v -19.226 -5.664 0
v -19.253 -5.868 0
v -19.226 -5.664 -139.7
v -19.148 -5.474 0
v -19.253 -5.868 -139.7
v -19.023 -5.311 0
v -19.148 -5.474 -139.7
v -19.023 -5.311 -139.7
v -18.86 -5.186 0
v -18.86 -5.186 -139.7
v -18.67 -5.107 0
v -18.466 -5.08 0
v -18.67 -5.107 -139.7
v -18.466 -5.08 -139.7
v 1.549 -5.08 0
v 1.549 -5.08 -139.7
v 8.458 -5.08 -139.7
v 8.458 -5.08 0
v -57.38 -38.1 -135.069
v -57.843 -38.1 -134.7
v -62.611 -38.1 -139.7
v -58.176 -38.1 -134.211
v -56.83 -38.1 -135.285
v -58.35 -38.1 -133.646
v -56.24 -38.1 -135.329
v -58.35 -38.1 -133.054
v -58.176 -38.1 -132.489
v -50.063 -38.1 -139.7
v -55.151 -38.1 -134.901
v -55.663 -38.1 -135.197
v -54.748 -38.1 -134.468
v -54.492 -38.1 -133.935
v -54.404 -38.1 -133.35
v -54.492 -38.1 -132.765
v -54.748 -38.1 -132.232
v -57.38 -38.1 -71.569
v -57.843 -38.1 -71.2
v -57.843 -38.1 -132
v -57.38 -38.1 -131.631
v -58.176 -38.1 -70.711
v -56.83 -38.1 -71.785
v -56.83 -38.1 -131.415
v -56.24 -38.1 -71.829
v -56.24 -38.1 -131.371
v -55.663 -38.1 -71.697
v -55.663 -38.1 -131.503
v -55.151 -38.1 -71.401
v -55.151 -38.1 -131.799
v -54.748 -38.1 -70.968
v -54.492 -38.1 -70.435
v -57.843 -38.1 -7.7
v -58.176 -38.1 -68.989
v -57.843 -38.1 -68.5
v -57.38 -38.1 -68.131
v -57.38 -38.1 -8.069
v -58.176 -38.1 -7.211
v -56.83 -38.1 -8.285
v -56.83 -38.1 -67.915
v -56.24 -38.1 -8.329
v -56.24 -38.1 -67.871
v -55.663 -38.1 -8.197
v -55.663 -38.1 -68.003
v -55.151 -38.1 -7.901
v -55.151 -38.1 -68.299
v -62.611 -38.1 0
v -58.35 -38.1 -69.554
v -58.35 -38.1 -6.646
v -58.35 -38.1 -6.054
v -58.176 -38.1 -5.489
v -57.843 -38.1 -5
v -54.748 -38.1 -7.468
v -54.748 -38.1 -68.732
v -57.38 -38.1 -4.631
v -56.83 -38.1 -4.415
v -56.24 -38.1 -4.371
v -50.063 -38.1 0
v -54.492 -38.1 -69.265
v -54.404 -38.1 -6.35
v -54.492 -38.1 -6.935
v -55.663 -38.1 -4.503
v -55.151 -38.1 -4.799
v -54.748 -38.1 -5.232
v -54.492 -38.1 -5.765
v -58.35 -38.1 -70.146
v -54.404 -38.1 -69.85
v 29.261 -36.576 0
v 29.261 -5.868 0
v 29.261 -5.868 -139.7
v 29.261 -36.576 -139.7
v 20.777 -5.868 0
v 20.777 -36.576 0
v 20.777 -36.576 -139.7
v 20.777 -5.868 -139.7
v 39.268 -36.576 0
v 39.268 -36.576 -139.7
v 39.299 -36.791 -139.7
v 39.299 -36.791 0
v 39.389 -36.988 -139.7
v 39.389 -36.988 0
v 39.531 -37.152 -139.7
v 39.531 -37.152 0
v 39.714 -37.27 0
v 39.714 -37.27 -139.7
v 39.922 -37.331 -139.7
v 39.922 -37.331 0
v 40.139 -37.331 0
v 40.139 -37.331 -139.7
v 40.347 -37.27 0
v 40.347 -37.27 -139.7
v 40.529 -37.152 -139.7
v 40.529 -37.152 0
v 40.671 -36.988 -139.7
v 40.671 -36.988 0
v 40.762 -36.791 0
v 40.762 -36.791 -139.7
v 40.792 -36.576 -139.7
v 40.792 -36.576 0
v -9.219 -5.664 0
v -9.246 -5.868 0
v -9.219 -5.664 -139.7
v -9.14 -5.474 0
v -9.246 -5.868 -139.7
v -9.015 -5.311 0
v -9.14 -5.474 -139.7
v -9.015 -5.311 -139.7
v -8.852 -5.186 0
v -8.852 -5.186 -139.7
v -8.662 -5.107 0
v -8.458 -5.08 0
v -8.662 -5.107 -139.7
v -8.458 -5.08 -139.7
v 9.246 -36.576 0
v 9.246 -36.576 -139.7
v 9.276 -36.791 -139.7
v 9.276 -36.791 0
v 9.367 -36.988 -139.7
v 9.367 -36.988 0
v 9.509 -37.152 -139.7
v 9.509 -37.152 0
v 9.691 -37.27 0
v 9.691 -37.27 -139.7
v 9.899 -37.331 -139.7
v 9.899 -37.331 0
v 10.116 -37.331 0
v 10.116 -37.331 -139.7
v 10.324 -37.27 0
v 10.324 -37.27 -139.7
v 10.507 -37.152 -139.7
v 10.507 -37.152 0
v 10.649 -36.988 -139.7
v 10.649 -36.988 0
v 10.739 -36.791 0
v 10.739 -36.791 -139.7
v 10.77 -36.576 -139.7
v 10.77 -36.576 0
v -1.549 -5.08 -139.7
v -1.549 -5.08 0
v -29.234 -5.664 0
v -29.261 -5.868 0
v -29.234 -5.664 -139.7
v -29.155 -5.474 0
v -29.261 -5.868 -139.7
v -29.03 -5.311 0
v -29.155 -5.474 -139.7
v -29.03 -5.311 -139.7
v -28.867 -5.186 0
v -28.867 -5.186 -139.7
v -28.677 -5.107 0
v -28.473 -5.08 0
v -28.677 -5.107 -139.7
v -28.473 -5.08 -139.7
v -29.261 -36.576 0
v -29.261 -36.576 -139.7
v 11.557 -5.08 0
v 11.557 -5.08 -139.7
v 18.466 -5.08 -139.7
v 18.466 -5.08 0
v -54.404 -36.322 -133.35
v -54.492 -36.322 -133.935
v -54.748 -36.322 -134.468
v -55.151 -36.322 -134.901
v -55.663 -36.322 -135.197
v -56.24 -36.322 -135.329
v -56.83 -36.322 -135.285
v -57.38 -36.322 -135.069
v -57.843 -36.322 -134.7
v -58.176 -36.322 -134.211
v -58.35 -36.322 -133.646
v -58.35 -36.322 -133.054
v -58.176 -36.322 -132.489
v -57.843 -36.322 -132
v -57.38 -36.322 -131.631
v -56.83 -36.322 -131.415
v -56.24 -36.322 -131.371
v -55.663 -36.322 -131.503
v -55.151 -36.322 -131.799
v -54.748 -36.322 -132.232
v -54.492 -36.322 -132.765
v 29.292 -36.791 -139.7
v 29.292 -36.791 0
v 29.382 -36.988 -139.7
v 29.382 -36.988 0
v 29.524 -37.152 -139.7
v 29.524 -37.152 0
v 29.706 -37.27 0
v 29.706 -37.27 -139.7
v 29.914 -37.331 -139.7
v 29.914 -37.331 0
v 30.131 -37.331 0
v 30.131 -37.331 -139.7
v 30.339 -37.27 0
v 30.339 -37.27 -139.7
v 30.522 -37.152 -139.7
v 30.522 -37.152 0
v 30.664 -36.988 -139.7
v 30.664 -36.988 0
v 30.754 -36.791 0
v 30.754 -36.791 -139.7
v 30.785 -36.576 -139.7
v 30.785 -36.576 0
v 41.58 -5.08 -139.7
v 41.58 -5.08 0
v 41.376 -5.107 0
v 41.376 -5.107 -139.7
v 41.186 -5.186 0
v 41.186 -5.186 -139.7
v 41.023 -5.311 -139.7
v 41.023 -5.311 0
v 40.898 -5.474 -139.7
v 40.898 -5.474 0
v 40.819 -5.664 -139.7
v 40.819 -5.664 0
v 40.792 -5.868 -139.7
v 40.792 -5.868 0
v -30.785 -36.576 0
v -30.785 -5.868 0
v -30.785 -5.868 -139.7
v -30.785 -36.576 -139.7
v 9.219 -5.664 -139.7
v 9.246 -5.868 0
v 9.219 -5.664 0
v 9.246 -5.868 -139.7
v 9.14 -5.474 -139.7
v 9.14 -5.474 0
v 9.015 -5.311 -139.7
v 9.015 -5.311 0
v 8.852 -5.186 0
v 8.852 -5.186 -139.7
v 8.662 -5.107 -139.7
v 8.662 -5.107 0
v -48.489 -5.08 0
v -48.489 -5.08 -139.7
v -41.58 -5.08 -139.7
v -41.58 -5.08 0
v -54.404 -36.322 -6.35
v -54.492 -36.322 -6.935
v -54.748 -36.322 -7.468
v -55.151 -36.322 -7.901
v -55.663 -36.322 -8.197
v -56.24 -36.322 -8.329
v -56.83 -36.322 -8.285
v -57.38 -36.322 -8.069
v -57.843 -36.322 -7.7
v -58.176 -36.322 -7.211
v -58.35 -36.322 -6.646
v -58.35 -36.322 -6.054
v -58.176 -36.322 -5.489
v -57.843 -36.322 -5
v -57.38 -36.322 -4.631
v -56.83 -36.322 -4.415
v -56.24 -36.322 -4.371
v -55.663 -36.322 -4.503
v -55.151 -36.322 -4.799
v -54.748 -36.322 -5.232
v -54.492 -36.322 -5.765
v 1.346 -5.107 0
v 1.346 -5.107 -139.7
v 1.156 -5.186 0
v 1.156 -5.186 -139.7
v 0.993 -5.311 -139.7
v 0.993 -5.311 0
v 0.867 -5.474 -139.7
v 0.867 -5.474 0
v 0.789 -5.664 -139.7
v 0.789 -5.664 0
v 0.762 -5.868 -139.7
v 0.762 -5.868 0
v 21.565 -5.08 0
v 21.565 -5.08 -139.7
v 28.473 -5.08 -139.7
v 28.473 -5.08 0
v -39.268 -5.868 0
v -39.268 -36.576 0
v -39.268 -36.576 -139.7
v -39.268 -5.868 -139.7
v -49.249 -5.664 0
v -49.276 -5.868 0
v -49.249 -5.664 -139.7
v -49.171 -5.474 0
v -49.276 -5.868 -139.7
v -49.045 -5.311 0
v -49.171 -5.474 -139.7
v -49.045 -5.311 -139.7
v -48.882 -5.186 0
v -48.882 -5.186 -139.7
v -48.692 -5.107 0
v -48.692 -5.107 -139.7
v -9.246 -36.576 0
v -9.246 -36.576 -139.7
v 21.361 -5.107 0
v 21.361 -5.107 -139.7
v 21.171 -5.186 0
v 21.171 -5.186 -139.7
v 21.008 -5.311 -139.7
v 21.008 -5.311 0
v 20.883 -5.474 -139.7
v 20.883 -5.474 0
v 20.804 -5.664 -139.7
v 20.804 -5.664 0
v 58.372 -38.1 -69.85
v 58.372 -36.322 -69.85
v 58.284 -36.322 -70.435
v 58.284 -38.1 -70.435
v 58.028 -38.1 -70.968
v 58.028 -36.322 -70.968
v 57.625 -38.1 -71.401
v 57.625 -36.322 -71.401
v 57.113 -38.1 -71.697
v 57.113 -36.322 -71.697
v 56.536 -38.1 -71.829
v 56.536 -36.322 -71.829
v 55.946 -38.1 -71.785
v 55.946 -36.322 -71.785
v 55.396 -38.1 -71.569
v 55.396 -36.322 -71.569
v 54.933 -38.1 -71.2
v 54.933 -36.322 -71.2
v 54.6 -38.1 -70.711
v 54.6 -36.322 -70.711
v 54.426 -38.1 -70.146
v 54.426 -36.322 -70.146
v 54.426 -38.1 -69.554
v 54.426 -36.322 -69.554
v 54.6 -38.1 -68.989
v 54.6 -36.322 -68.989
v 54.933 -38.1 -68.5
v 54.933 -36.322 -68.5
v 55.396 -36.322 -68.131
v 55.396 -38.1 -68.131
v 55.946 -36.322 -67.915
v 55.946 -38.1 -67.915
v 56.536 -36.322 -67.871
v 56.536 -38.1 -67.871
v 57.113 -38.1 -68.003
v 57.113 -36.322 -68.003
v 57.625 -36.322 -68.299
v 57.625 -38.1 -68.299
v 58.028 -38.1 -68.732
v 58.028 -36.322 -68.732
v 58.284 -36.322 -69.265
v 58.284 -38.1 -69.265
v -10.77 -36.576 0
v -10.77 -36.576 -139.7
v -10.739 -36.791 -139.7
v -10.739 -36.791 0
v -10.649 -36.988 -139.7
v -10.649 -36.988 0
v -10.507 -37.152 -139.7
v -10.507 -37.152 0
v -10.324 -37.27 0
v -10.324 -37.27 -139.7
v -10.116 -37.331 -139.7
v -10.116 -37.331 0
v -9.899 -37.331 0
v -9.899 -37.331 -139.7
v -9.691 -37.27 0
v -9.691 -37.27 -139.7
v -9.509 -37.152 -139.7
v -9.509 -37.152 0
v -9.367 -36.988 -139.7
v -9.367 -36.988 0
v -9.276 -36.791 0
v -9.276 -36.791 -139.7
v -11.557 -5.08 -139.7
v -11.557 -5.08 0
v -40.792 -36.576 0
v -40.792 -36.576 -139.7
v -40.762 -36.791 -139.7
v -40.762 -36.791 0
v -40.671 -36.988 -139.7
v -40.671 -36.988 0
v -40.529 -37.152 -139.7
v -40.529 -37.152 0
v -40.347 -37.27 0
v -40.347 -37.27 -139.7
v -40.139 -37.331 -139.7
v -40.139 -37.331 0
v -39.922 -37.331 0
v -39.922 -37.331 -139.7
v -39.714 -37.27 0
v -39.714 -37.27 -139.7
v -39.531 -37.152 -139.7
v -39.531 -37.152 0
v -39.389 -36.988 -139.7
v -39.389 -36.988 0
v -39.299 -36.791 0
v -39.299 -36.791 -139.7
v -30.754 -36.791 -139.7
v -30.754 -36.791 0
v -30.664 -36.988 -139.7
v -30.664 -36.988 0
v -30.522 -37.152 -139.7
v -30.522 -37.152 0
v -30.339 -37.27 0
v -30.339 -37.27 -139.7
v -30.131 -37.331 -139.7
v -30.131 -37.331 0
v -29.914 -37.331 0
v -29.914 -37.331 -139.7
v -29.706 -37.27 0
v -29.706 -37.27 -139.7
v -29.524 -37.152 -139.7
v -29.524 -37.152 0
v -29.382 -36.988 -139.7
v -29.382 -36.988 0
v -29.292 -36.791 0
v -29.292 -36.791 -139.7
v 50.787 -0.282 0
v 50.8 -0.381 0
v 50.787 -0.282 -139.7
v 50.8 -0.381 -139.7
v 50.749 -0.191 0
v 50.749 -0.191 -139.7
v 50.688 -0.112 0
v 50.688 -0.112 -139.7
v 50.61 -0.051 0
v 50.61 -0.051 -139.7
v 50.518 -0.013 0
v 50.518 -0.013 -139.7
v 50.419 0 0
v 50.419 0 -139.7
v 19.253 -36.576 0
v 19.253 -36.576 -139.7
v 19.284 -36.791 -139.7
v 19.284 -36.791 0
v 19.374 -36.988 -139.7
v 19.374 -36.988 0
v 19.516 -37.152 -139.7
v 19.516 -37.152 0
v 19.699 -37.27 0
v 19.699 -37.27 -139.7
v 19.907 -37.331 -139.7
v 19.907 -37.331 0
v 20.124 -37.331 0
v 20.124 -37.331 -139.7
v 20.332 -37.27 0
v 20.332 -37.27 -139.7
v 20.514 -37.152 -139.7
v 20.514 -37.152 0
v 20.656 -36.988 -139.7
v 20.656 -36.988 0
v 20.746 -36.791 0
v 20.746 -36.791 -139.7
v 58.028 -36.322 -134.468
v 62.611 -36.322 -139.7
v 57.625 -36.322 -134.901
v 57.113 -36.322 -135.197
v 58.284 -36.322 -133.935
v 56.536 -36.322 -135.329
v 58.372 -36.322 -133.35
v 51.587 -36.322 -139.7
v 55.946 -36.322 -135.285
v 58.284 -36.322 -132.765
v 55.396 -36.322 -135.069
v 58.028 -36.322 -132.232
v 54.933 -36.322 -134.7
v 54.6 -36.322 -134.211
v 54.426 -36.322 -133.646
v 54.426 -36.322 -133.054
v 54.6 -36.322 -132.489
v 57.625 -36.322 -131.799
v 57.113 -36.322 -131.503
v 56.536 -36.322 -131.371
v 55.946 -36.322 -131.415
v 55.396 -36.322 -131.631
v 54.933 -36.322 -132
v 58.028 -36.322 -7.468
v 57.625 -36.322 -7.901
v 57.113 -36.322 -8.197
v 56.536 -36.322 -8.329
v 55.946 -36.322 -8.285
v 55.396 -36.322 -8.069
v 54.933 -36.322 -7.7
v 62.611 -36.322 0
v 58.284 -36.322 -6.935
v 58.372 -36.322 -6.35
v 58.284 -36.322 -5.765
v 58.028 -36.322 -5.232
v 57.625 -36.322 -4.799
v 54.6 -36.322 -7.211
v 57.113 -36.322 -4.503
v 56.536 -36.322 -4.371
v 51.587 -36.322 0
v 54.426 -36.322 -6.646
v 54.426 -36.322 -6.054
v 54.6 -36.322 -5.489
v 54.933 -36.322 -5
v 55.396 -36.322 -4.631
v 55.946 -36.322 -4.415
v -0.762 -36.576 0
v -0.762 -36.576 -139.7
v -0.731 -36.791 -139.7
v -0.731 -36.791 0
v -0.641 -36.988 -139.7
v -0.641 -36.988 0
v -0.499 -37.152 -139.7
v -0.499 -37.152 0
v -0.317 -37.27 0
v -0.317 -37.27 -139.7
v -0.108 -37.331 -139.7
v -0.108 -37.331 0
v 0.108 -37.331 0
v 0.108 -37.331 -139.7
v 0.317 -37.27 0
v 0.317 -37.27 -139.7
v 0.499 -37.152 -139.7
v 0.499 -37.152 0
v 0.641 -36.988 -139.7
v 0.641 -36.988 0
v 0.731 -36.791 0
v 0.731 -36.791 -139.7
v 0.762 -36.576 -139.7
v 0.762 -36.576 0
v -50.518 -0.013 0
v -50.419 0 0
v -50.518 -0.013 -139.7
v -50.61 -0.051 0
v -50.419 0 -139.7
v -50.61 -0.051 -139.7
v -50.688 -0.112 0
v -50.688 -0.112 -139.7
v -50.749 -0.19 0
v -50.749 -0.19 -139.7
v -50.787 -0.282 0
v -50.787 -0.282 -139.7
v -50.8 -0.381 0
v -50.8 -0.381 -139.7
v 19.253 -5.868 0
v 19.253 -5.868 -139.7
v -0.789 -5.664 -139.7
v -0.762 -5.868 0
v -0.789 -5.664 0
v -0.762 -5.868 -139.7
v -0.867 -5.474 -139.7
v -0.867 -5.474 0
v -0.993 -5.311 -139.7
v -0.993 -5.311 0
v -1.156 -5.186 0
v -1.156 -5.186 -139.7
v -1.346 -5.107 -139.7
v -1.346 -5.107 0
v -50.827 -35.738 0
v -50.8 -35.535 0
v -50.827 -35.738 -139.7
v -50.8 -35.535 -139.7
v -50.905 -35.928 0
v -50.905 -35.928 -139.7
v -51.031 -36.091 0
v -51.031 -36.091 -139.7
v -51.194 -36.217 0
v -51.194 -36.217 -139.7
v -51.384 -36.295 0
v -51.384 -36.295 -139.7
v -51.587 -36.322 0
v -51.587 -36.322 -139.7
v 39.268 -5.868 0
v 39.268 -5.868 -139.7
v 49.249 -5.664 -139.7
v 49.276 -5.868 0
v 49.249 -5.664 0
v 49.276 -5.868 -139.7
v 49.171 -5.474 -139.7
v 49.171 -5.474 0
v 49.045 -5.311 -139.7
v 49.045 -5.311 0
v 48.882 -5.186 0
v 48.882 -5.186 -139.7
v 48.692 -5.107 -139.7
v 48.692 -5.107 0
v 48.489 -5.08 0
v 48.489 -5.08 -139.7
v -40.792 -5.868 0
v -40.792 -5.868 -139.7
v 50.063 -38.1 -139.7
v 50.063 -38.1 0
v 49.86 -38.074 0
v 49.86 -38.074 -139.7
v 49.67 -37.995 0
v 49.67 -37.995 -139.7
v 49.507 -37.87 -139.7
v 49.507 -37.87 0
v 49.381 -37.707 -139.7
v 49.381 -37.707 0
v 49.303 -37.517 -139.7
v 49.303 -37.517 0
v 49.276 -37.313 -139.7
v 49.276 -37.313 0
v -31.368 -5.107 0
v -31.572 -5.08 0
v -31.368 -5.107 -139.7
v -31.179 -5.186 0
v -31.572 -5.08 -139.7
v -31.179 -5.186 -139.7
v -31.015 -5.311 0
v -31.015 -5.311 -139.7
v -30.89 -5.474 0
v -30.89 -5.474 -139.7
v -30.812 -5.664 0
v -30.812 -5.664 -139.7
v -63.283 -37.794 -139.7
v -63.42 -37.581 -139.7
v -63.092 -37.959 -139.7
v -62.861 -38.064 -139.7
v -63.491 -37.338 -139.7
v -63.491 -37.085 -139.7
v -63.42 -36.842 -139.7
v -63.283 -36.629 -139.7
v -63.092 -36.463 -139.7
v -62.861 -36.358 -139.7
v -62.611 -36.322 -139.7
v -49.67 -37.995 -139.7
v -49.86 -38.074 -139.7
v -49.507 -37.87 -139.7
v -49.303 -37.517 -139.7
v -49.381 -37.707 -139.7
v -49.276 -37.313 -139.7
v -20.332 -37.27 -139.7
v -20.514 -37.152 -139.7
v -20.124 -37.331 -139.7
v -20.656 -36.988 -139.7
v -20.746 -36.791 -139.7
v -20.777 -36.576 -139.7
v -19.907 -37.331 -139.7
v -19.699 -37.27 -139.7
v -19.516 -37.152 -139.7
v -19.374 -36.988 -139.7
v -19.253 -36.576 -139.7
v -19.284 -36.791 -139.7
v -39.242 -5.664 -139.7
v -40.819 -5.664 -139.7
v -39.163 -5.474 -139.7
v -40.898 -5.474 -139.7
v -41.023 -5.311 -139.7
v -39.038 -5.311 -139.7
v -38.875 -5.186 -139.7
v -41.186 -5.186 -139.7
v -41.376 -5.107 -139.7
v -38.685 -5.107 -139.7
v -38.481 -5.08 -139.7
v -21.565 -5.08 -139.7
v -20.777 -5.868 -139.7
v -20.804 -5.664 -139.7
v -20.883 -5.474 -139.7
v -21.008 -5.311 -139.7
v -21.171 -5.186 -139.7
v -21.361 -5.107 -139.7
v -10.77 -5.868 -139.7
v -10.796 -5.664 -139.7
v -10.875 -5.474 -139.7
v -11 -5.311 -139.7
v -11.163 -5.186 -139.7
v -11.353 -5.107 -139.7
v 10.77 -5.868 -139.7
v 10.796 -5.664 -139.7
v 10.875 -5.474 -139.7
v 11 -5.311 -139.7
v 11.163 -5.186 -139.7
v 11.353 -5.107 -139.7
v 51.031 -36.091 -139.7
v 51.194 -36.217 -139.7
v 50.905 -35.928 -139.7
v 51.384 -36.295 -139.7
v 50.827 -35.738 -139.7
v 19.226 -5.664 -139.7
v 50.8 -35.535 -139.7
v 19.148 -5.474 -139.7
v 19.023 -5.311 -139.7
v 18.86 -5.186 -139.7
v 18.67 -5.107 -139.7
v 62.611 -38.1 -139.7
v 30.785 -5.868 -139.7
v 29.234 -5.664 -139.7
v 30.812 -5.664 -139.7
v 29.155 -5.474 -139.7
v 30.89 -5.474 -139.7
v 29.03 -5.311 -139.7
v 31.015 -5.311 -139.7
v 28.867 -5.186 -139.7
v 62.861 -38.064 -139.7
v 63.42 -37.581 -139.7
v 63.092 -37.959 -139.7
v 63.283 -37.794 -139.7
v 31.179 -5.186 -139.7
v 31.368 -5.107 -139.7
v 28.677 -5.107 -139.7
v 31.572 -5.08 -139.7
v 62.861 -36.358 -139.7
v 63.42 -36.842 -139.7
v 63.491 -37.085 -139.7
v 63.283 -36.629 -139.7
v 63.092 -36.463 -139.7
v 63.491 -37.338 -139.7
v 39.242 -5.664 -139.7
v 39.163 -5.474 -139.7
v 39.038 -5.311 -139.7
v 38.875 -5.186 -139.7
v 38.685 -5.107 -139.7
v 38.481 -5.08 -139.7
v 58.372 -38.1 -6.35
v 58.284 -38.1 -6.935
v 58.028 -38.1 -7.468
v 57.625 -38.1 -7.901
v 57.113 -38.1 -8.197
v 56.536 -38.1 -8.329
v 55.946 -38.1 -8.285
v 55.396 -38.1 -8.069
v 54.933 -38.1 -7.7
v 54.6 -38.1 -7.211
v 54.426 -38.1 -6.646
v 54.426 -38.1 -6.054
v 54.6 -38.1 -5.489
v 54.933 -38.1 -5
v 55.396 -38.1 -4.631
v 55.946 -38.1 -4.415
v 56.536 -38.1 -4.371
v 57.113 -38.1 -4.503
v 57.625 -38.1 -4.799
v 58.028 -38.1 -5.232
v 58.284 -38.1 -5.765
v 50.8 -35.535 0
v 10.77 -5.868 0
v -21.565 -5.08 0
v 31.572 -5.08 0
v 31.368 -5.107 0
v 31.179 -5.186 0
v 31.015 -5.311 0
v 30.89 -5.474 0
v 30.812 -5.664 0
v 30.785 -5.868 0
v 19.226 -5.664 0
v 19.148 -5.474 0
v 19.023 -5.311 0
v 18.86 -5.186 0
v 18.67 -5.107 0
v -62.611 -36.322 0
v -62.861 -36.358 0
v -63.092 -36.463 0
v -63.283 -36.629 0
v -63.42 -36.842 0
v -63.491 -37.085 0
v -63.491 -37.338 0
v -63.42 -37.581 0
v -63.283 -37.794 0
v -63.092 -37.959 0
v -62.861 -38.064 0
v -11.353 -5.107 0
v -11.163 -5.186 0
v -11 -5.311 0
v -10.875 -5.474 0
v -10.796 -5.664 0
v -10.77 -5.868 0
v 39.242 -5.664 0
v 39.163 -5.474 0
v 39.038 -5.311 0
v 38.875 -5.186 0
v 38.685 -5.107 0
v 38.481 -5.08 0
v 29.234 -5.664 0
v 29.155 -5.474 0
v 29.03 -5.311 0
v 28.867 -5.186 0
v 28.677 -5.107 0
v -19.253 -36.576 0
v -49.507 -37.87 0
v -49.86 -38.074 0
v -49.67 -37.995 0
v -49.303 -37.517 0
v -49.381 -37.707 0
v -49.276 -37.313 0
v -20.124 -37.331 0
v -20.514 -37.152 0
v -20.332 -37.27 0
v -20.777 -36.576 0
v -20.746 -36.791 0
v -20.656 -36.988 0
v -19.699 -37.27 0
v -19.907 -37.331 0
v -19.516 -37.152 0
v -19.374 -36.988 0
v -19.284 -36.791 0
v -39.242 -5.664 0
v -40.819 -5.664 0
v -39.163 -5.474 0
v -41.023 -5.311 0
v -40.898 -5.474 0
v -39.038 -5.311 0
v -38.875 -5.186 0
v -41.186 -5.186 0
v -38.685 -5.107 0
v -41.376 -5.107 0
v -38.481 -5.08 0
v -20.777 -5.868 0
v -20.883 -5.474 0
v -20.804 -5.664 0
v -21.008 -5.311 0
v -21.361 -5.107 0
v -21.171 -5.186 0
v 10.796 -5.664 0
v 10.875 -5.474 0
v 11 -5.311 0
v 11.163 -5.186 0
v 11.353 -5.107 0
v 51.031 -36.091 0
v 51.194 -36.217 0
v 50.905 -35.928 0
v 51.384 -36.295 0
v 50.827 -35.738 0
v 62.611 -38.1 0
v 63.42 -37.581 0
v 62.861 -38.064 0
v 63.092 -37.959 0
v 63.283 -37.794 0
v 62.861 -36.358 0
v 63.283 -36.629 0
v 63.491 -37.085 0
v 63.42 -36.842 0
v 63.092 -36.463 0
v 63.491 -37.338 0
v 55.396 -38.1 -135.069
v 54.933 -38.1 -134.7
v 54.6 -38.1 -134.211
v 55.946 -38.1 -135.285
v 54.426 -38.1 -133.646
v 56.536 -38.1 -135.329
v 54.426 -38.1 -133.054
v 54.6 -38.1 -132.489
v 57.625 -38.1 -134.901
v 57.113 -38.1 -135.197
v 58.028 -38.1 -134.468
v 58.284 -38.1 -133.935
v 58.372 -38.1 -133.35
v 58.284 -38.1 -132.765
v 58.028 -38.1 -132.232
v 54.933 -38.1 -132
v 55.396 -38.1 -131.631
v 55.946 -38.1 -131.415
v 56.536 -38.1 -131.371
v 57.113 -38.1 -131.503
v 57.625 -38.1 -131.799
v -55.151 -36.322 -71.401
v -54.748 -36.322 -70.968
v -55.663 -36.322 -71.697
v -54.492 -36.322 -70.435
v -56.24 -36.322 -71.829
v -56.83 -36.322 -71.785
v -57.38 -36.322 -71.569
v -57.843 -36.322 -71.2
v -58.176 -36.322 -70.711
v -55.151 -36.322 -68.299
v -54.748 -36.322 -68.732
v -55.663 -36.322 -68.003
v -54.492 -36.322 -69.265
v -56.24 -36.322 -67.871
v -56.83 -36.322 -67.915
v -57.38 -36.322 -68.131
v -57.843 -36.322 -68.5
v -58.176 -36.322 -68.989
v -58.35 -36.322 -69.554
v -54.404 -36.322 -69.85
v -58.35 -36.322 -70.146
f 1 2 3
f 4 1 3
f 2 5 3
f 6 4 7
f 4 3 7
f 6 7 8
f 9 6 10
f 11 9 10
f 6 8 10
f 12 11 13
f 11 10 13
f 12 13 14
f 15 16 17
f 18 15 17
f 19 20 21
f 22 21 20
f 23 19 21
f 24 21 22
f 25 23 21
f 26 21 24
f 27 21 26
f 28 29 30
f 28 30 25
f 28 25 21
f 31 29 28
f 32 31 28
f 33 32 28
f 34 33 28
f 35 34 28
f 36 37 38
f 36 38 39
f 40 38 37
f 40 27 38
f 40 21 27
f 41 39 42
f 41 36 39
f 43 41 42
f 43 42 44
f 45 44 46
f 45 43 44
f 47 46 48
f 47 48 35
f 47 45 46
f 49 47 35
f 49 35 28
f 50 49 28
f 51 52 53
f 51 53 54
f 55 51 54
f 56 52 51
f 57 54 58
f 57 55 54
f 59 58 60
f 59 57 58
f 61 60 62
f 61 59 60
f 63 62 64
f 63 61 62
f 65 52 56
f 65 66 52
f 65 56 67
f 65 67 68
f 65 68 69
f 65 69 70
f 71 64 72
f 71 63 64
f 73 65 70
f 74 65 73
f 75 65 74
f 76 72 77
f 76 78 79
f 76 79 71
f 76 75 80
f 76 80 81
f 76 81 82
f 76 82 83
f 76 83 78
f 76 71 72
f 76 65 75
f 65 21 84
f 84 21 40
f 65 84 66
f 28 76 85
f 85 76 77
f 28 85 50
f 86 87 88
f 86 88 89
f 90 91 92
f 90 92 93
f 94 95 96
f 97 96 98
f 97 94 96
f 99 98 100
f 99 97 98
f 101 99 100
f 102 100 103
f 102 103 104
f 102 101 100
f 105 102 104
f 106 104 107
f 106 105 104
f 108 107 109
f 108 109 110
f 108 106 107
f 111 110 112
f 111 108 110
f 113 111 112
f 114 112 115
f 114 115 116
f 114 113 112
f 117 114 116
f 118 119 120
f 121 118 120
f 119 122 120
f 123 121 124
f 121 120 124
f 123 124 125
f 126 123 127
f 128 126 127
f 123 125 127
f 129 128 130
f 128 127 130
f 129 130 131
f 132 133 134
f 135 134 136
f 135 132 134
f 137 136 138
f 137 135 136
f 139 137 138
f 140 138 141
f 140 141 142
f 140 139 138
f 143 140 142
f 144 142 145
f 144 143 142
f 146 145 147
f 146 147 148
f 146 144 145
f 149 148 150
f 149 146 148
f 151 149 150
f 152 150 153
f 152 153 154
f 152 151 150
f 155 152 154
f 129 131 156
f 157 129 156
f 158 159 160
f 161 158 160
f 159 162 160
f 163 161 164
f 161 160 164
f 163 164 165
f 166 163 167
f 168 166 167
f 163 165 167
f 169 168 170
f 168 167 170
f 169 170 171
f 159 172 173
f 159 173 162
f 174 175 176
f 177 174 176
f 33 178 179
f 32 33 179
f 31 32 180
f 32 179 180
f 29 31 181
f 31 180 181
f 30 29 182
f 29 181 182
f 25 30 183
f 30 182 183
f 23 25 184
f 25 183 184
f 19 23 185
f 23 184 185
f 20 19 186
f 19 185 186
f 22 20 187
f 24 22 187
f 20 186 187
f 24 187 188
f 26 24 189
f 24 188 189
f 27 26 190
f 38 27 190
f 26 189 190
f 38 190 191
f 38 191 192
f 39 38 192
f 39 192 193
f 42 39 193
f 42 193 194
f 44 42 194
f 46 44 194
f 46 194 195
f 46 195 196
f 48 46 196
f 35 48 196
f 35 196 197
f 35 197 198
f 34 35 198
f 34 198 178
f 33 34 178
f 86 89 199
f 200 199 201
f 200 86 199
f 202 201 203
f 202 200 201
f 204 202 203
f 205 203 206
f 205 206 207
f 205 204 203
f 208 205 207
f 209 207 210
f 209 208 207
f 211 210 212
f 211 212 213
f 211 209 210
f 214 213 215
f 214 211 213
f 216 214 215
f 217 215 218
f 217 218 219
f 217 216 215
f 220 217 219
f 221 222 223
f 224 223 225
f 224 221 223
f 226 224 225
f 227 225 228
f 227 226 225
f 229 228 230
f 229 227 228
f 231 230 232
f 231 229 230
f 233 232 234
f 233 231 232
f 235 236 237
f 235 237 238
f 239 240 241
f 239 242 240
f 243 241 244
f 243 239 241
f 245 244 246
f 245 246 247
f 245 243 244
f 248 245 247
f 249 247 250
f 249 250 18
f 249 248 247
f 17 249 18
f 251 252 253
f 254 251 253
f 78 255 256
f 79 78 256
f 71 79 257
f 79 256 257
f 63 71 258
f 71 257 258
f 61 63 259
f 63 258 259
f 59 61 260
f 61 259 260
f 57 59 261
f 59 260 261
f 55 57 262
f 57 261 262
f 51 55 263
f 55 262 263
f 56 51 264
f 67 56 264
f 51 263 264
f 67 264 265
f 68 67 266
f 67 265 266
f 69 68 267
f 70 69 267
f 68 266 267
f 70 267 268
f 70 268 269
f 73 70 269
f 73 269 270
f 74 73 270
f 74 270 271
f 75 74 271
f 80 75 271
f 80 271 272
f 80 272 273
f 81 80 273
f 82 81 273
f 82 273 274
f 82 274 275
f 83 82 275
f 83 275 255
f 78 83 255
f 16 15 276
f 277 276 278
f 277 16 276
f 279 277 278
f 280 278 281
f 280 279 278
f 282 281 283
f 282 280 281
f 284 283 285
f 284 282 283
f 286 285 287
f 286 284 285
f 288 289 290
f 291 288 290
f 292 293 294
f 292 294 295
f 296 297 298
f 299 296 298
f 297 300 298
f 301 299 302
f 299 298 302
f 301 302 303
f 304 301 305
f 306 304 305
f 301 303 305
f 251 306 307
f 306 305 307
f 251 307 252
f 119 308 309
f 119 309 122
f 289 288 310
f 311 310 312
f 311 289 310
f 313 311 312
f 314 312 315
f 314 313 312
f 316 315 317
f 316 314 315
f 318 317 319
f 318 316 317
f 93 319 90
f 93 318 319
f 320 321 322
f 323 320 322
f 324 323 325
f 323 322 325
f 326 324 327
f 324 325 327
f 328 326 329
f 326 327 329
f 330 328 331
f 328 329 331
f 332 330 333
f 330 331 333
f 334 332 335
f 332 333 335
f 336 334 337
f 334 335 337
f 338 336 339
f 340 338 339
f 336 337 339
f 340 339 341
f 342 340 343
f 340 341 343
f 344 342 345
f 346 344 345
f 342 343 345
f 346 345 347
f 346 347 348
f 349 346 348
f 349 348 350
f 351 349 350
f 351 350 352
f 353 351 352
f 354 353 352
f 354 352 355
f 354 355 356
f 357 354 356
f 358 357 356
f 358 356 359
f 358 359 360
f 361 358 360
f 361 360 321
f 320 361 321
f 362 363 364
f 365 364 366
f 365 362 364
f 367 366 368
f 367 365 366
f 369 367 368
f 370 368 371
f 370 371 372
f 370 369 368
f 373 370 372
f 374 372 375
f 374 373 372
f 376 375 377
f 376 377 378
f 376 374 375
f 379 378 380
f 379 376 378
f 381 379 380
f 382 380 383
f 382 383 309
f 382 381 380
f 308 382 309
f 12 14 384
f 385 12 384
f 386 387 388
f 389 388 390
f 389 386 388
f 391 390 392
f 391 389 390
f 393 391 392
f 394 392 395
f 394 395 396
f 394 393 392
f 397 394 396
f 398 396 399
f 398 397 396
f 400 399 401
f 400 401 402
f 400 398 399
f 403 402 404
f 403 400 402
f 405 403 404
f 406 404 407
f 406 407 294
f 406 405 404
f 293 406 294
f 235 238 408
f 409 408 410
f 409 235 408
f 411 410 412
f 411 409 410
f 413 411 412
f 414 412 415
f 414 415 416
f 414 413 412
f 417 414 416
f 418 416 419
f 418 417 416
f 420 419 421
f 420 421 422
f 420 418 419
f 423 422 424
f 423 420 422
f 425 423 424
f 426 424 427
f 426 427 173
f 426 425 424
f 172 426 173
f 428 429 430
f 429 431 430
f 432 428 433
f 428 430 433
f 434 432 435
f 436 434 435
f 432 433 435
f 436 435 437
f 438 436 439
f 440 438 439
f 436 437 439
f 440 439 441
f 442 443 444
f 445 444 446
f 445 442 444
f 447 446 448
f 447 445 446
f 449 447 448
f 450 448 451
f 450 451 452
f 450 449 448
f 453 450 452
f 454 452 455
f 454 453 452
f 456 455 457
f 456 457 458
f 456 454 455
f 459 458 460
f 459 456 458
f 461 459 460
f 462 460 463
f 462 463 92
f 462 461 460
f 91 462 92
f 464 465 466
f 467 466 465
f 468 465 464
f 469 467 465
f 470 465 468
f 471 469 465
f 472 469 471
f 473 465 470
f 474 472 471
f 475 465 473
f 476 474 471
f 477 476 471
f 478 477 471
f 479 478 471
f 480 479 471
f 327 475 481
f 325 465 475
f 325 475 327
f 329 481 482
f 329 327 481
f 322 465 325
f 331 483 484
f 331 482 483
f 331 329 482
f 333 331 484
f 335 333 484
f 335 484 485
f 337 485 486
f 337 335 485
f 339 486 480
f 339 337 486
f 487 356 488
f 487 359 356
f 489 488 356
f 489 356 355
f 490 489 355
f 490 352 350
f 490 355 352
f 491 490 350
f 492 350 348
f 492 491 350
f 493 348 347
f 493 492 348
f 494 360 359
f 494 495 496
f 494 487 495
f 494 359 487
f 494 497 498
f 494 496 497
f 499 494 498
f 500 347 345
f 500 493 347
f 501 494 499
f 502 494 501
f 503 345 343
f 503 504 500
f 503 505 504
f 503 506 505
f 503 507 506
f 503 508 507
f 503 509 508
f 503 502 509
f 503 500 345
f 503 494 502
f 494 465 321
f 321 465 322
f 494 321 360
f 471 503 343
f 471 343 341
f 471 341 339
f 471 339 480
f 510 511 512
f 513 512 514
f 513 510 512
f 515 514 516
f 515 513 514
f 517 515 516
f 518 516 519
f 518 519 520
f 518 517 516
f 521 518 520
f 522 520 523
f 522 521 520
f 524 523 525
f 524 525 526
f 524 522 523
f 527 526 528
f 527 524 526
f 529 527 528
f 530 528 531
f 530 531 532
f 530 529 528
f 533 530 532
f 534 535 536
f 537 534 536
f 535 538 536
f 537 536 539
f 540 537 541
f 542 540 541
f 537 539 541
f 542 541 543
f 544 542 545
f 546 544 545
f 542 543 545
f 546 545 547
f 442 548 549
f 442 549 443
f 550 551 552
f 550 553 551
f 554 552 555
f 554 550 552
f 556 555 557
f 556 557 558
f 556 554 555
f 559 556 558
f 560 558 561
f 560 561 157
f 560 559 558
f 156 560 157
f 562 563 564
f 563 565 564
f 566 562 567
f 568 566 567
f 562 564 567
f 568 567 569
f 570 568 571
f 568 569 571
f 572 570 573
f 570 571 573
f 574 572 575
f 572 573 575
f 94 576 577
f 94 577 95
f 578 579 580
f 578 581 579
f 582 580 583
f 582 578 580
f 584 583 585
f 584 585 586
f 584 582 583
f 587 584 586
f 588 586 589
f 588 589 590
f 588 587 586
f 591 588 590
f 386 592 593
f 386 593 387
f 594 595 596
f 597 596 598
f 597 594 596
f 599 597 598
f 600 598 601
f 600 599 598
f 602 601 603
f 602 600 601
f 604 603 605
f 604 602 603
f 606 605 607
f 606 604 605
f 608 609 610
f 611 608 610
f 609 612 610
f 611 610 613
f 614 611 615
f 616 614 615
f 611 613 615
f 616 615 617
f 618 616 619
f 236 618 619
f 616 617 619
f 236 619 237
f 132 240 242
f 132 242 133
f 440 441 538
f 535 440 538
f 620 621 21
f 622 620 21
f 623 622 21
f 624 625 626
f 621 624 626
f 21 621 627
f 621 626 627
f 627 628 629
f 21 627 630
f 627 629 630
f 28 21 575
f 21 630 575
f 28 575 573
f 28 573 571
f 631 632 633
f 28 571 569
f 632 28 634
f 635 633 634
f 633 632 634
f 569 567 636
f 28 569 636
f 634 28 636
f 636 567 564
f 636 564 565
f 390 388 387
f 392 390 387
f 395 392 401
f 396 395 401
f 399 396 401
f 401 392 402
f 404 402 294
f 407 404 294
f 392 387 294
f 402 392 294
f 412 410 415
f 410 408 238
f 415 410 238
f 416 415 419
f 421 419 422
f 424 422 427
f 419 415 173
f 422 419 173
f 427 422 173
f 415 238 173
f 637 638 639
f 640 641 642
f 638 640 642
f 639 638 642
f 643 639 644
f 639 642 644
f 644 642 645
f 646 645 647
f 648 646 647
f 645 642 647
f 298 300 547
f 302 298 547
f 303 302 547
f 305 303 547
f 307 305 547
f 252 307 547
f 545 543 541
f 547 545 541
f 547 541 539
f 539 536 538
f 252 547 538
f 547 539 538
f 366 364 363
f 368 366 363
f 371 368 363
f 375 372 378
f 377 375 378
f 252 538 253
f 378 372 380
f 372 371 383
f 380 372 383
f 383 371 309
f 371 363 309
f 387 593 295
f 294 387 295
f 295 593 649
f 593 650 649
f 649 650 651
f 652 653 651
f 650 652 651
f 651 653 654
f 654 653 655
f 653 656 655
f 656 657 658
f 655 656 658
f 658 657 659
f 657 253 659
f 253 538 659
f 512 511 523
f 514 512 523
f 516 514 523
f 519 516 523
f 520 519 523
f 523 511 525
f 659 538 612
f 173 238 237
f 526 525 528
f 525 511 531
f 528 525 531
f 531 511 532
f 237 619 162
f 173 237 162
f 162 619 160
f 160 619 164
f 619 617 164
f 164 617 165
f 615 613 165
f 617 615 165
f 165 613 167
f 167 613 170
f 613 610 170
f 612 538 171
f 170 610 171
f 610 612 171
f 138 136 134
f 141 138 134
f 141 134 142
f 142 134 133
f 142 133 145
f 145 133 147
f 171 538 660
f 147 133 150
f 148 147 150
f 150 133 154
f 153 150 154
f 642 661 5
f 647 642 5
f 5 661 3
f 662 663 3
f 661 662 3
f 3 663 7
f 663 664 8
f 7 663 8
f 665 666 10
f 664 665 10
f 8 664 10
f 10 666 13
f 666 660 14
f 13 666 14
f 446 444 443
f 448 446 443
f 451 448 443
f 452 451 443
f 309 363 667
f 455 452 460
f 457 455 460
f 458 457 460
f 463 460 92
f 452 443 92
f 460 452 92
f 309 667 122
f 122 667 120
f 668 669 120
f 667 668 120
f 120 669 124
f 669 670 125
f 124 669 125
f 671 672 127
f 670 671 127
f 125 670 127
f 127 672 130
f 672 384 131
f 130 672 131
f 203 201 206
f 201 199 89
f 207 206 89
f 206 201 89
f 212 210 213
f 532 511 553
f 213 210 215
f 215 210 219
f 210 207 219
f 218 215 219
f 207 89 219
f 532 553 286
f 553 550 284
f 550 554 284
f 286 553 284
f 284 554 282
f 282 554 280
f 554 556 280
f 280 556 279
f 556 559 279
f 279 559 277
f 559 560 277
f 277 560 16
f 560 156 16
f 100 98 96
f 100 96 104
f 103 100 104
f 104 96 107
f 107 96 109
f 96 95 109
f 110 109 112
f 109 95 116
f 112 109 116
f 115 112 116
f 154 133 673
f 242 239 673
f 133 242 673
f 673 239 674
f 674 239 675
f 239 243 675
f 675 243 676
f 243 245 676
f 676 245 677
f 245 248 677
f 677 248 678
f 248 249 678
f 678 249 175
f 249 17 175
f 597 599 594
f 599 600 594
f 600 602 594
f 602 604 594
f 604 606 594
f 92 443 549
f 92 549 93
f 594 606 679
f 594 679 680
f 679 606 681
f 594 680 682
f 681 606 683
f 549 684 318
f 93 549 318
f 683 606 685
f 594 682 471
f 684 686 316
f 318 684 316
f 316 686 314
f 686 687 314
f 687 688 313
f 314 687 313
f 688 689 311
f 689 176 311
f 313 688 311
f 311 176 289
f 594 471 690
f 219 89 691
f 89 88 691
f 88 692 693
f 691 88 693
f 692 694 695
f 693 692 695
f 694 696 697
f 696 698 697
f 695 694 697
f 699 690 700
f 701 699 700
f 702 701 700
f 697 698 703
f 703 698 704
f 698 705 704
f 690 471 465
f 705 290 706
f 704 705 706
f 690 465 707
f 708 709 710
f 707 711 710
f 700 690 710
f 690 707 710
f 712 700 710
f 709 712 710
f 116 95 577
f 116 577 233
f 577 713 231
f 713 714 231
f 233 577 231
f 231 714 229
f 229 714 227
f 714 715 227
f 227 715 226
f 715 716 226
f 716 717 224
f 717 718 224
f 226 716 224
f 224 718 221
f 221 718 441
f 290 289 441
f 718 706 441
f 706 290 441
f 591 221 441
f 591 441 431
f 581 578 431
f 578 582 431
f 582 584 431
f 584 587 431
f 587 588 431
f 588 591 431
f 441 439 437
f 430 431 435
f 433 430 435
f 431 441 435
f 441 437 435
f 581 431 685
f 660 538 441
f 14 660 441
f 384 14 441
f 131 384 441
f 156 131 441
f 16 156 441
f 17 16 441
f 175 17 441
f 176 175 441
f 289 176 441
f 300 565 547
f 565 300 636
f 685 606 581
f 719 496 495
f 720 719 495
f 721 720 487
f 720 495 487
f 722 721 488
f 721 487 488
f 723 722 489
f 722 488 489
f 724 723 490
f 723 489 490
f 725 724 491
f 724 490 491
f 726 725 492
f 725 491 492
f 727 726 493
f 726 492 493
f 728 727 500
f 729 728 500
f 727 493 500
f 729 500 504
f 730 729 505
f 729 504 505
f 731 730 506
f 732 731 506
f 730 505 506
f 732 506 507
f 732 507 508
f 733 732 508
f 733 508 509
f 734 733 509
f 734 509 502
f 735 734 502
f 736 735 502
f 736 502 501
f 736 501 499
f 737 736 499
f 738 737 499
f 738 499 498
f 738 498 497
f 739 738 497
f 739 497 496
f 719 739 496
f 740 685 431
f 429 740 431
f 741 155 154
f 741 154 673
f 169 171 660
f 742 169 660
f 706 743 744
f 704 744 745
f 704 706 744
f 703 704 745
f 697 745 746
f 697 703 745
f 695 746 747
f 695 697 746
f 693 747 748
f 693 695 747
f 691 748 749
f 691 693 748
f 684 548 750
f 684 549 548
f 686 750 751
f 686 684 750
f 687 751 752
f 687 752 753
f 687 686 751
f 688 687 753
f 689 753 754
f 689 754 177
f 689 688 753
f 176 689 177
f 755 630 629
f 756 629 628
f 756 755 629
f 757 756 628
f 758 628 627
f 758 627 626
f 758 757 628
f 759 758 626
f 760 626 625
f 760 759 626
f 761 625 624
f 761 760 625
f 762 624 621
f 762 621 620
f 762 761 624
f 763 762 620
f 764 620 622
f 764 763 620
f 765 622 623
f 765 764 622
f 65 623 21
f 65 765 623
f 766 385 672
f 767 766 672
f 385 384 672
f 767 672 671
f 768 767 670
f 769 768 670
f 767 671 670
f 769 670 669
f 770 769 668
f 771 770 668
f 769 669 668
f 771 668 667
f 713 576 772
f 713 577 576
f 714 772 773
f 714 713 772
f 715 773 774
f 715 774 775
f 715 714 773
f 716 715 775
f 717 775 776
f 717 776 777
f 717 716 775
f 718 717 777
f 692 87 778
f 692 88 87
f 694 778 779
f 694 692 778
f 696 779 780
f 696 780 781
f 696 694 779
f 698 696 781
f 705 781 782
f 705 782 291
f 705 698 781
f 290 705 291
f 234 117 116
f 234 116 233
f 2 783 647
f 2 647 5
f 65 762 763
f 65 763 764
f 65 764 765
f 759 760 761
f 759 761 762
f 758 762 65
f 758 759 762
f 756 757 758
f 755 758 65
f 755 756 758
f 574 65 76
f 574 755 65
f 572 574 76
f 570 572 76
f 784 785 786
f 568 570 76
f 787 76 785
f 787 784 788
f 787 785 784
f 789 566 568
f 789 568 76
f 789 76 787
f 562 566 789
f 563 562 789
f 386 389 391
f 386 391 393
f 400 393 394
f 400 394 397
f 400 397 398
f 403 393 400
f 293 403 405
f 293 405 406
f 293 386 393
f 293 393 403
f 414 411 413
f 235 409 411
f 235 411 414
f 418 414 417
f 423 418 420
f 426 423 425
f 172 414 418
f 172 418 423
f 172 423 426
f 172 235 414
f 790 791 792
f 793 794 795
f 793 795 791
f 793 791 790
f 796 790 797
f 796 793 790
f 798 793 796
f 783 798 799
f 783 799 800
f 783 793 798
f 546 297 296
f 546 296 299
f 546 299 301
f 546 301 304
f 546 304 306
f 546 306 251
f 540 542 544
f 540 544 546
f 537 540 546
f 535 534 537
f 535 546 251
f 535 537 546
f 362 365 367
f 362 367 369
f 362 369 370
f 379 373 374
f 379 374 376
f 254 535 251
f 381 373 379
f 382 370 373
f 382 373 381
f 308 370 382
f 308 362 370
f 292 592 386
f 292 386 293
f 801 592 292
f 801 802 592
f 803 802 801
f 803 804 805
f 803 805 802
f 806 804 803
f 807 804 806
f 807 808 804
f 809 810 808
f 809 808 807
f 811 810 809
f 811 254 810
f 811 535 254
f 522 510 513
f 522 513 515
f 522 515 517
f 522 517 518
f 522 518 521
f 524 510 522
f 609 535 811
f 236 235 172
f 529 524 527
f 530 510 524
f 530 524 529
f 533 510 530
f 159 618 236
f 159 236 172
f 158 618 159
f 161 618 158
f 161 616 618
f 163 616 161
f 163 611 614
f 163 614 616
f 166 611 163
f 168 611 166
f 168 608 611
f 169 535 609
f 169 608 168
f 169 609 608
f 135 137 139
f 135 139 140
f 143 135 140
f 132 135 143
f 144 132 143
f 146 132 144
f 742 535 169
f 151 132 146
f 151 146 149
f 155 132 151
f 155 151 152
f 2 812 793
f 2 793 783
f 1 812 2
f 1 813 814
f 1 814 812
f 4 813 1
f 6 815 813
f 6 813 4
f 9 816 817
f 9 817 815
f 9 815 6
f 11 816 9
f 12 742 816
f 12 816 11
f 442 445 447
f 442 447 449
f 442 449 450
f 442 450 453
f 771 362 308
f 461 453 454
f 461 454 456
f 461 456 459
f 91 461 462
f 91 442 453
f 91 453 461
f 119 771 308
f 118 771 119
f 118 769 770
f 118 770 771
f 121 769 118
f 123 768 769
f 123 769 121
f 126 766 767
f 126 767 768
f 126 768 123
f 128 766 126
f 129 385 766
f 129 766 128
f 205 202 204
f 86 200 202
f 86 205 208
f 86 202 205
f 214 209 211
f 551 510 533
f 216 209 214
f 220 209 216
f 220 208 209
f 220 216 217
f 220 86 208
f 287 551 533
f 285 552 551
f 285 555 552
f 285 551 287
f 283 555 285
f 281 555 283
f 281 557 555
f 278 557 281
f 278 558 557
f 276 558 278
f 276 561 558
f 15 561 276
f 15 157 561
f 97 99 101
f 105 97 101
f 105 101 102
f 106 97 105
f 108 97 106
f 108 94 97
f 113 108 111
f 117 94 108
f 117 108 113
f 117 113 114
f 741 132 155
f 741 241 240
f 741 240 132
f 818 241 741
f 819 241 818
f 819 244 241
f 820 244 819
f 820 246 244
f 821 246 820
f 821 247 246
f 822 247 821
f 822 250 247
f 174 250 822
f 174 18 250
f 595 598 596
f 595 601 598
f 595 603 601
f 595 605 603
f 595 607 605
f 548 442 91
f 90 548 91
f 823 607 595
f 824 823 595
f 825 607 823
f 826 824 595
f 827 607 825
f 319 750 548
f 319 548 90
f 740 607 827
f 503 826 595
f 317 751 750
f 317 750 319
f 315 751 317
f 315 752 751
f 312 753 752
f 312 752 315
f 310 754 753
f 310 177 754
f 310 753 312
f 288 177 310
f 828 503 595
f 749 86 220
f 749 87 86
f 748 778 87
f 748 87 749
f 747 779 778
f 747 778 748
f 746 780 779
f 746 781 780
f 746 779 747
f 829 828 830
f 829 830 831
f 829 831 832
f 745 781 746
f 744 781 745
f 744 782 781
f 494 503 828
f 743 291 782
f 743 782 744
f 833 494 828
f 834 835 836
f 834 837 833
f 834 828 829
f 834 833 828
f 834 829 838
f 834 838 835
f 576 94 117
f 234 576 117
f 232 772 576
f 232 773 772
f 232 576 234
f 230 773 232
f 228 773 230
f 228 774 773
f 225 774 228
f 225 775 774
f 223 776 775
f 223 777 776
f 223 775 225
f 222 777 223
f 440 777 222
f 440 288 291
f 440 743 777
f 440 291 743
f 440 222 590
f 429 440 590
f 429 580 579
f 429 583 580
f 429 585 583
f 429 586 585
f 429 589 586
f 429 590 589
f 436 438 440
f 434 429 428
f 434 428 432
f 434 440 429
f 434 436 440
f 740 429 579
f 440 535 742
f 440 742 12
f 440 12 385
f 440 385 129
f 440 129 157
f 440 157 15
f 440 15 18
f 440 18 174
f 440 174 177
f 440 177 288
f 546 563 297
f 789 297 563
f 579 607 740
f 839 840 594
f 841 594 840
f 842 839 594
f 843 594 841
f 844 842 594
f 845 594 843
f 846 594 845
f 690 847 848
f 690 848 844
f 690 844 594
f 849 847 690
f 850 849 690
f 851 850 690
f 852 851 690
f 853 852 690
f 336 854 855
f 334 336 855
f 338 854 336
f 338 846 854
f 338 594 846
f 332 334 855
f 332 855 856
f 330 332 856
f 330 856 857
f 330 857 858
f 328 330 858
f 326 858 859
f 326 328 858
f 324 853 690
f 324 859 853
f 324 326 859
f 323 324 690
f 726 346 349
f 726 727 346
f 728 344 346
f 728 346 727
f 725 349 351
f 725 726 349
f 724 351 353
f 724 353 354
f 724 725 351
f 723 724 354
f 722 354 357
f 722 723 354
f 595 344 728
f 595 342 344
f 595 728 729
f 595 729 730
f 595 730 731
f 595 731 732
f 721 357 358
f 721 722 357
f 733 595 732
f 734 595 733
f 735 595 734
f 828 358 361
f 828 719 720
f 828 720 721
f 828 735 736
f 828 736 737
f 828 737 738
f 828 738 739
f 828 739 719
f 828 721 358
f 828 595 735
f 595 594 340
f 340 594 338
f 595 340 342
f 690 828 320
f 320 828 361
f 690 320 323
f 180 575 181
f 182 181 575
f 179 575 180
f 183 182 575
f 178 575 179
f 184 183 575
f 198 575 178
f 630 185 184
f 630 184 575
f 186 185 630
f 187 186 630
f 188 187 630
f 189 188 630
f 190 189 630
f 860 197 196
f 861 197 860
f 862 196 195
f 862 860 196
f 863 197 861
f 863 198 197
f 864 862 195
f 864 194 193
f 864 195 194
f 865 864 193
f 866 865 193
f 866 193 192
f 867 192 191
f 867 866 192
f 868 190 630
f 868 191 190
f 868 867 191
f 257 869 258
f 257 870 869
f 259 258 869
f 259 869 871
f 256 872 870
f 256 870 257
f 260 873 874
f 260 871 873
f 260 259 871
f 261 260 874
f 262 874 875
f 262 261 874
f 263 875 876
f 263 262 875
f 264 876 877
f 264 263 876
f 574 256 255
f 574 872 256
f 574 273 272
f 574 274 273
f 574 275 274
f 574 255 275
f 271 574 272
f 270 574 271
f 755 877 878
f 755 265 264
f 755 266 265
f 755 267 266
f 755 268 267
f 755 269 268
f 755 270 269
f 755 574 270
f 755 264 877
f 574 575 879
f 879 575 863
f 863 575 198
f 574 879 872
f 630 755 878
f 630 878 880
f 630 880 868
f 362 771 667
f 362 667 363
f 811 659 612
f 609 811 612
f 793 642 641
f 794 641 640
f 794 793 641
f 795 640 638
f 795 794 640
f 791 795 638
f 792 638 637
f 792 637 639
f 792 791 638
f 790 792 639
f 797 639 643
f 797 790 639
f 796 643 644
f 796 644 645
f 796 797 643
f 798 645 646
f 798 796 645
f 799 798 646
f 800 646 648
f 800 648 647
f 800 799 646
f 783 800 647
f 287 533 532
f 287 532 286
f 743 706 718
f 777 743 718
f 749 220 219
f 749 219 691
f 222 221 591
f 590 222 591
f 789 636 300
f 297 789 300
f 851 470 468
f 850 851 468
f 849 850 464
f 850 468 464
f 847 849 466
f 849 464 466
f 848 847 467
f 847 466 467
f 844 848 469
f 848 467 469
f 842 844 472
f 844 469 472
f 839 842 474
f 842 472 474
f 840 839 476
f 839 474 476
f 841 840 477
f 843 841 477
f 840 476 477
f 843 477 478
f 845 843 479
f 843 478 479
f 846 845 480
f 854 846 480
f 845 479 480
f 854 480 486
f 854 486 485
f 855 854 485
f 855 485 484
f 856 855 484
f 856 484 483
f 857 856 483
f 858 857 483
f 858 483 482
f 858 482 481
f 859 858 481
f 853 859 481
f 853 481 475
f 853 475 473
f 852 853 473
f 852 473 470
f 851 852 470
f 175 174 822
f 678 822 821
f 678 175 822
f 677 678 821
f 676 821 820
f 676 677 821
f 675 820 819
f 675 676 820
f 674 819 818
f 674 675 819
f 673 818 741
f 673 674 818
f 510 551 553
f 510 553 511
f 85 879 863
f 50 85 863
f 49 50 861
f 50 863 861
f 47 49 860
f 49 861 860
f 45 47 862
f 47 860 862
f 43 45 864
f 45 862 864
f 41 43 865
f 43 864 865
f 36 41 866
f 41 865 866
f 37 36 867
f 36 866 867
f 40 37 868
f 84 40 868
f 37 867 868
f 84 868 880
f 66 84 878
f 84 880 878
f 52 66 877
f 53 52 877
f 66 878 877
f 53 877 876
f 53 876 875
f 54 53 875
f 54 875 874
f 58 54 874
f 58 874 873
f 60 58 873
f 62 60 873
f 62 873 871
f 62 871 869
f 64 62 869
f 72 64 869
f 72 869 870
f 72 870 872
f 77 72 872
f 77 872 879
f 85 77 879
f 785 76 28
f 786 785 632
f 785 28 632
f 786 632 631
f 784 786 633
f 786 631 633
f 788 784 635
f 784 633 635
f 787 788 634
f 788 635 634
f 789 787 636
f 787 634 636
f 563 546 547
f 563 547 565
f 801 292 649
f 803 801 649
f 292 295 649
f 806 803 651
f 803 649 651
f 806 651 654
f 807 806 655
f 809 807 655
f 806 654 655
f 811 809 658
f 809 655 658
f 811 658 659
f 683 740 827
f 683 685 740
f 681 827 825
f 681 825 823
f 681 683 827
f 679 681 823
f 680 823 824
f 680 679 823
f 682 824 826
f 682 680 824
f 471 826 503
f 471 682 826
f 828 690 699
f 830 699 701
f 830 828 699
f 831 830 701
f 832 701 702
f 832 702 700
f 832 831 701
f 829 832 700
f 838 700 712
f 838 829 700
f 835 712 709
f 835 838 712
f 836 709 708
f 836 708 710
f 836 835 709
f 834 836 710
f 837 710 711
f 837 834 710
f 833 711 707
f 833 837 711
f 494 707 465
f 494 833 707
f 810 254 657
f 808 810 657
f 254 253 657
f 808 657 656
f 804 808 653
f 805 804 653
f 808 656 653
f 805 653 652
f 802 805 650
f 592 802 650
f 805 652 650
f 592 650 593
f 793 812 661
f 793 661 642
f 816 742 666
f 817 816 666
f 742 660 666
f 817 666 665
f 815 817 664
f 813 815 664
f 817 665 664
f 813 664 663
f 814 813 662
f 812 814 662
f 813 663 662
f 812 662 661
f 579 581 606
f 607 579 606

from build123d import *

# Parameters (mm, degrees)
BOSS_EXTRUDE1_DEPTH                 = 139.7
F_5_32_0_15625_DIAMETER_HOLE1_D     = 3.96875
F_5_32_0_15625_DIAMETER_HOLE1_DEPTH = 38.100461051
FILLET1_R                           = 0.381
FILLET2_R                           = 0.7874


with BuildPart() as part:
    # Sketch1 → Boss-Extrude1 (new body)
    with BuildSketch(Plane.XY):
        with BuildLine():
            Line((62.610769474, -36.322), (50.8, -36.322))
            Line((50.8, -36.322), (50.8, 0))
            Line((50.8, 0), (-50.8, 0))
            Line((-50.8, 0), (-50.8, -36.322))
            Line((-50.8, -36.322), (-62.610769474, -36.322))
            ThreePointArc((-62.610769474, -36.322), (-63.5, -37.211230526), (-62.610769474, -38.100461051))
            Line((-62.610769474, -38.100461051), (-49.276, -38.100461051))
            Line((-49.276, -38.100461051), (-49.276, -5.080461051))
            Line((-49.276, -5.080461051), (-40.7924, -5.080461051))
            Line((-40.7924, -5.080461051), (-40.7924, -36.576461051))
            ThreePointArc((-40.7924, -36.576461051), (-40.0304, -37.338461051), (-39.2684, -36.576461051))
            Line((-39.2684, -36.576461051), (-39.2684, -5.080461051))
            Line((-39.2684, -5.080461051), (-30.7848, -5.080461051))
            Line((-30.7848, -5.080461051), (-30.7848, -36.576461051))
            ThreePointArc((-30.7848, -36.576461051), (-30.0228, -37.338461051), (-29.2608, -36.576461051))
            Line((-29.2608, -36.576461051), (-29.2608, -5.080461051))
            Line((-29.2608, -5.080461051), (-20.7772, -5.080461051))
            Line((-20.7772, -5.080461051), (-20.7772, -36.576461051))
            ThreePointArc((-20.7772, -36.576461051), (-20.0152, -37.338461051), (-19.2532, -36.576461051))
            Line((-19.2532, -36.576461051), (-19.2532, -5.080461051))
            Line((-19.2532, -5.080461051), (-10.7696, -5.080461051))
            Line((-10.7696, -5.080461051), (-10.7696, -36.576461051))
            ThreePointArc((-10.7696, -36.576461051), (-10.0076, -37.338461051), (-9.2456, -36.576461051))
            Line((-9.2456, -36.576461051), (-9.2456, -5.080461051))
            Line((-9.2456, -5.080461051), (-0.762, -5.080461051))
            Line((-0.762, -5.080461051), (-0.762, -36.576461051))
            ThreePointArc((-0.762, -36.576461051), (0, -37.338461051), (0.762, -36.576461051))
            Line((0.762, -36.576461051), (0.762, -5.080461051))
            Line((0.762, -5.080461051), (9.2456, -5.080461051))
            Line((9.2456, -5.080461051), (9.2456, -36.576461051))
            ThreePointArc((9.2456, -36.576461051), (10.0076, -37.338461051), (10.7696, -36.576461051))
            Line((10.7696, -36.576461051), (10.7696, -5.080461051))
            Line((10.7696, -5.080461051), (19.2532, -5.080461051))
            Line((19.2532, -5.080461051), (19.2532, -36.576461051))
            ThreePointArc((19.2532, -36.576461051), (20.0152, -37.338461051), (20.7772, -36.576461051))
            Line((20.7772, -36.576461051), (20.7772, -5.080461051))
            Line((20.7772, -5.080461051), (29.2608, -5.080461051))
            Line((29.2608, -5.080461051), (29.2608, -36.576461051))
            ThreePointArc((29.2608, -36.576461051), (30.0228, -37.338461051), (30.7848, -36.576461051))
            Line((30.7848, -36.576461051), (30.7848, -5.080461051))
            Line((30.7848, -5.080461051), (39.2684, -5.080461051))
            Line((39.2684, -5.080461051), (39.2684, -36.576461051))
            ThreePointArc((39.2684, -36.576461051), (40.0304, -37.338461051), (40.7924, -36.576461051))
            Line((40.7924, -36.576461051), (40.7924, -5.080461051))
            Line((40.7924, -5.080461051), (49.276, -5.080461051))
            Line((49.276, -5.080461051), (49.276, -38.100461051))
            Line((49.276, -38.100461051), (62.610769474, -38.100461051))
            ThreePointArc((62.610769474, -38.100461051), (63.5, -37.211230526), (62.610769474, -36.322))
        make_face()
    extrude(amount=-BOSS_EXTRUDE1_DEPTH)

    # 5/32 (0.15625) Diameter Hole1
    with Locations(Plane(origin=(0, -38.100461051, 0), x_dir=(-1, 0, 0), z_dir=(0, -1, 0))):
        with Locations((56.388, 6.35), (56.388, 69.85), (56.388, 133.35), (-56.388, 6.35), (-56.388, 69.85), (-56.388, 133.35)):
            Hole(F_5_32_0_15625_DIAMETER_HOLE1_D / 2, depth=F_5_32_0_15625_DIAMETER_HOLE1_DEPTH)

    # Fillet1
    fillet1_edges = [part.edges().sort_by_distance(p)[0] for p in [
        (-50.8, 0, -69.85),
        (50.8, 0, -69.85),
    ]]
    fillet(fillet1_edges, radius=FILLET1_R)

    # Fillet2
    fillet2_edges = [part.edges().sort_by_distance(p)[0] for p in [
        (49.276, -38.100461051, -69.85),
        (49.276, -5.080461051, -69.85),
        (40.7924, -5.080461051, -69.85),
        (39.2684, -5.080461051, -69.85),
        (30.7848, -5.080461051, -69.85),
        (29.2608, -5.080461051, -69.85),
        (20.7772, -5.080461051, -69.85),
        (19.2532, -5.080461051, -69.85),
        (10.7696, -5.080461051, -69.85),
        (9.2456, -5.080461051, -69.85),
        (0.762, -5.080461051, -69.85),
        (-0.762, -5.080461051, -69.85),
        (-9.2456, -5.080461051, -69.85),
        (-10.7696, -5.080461051, -69.85),
        (-19.2532, -5.080461051, -69.85),
        (-20.7772, -5.080461051, -69.85),
        (-29.2608, -5.080461051, -69.85),
        (-30.7848, -5.080461051, -69.85),
        (-39.2684, -5.080461051, -69.85),
        (-40.7924, -5.080461051, -69.85),
        (-49.276, -5.080461051, -69.85),
        (-49.276, -38.100461051, -69.85),
        (-50.8, -36.322, -69.85),
        (50.8, -36.322, -69.85),
    ]]
    fillet(fillet2_edges, radius=FILLET2_R)


solid = part.part
